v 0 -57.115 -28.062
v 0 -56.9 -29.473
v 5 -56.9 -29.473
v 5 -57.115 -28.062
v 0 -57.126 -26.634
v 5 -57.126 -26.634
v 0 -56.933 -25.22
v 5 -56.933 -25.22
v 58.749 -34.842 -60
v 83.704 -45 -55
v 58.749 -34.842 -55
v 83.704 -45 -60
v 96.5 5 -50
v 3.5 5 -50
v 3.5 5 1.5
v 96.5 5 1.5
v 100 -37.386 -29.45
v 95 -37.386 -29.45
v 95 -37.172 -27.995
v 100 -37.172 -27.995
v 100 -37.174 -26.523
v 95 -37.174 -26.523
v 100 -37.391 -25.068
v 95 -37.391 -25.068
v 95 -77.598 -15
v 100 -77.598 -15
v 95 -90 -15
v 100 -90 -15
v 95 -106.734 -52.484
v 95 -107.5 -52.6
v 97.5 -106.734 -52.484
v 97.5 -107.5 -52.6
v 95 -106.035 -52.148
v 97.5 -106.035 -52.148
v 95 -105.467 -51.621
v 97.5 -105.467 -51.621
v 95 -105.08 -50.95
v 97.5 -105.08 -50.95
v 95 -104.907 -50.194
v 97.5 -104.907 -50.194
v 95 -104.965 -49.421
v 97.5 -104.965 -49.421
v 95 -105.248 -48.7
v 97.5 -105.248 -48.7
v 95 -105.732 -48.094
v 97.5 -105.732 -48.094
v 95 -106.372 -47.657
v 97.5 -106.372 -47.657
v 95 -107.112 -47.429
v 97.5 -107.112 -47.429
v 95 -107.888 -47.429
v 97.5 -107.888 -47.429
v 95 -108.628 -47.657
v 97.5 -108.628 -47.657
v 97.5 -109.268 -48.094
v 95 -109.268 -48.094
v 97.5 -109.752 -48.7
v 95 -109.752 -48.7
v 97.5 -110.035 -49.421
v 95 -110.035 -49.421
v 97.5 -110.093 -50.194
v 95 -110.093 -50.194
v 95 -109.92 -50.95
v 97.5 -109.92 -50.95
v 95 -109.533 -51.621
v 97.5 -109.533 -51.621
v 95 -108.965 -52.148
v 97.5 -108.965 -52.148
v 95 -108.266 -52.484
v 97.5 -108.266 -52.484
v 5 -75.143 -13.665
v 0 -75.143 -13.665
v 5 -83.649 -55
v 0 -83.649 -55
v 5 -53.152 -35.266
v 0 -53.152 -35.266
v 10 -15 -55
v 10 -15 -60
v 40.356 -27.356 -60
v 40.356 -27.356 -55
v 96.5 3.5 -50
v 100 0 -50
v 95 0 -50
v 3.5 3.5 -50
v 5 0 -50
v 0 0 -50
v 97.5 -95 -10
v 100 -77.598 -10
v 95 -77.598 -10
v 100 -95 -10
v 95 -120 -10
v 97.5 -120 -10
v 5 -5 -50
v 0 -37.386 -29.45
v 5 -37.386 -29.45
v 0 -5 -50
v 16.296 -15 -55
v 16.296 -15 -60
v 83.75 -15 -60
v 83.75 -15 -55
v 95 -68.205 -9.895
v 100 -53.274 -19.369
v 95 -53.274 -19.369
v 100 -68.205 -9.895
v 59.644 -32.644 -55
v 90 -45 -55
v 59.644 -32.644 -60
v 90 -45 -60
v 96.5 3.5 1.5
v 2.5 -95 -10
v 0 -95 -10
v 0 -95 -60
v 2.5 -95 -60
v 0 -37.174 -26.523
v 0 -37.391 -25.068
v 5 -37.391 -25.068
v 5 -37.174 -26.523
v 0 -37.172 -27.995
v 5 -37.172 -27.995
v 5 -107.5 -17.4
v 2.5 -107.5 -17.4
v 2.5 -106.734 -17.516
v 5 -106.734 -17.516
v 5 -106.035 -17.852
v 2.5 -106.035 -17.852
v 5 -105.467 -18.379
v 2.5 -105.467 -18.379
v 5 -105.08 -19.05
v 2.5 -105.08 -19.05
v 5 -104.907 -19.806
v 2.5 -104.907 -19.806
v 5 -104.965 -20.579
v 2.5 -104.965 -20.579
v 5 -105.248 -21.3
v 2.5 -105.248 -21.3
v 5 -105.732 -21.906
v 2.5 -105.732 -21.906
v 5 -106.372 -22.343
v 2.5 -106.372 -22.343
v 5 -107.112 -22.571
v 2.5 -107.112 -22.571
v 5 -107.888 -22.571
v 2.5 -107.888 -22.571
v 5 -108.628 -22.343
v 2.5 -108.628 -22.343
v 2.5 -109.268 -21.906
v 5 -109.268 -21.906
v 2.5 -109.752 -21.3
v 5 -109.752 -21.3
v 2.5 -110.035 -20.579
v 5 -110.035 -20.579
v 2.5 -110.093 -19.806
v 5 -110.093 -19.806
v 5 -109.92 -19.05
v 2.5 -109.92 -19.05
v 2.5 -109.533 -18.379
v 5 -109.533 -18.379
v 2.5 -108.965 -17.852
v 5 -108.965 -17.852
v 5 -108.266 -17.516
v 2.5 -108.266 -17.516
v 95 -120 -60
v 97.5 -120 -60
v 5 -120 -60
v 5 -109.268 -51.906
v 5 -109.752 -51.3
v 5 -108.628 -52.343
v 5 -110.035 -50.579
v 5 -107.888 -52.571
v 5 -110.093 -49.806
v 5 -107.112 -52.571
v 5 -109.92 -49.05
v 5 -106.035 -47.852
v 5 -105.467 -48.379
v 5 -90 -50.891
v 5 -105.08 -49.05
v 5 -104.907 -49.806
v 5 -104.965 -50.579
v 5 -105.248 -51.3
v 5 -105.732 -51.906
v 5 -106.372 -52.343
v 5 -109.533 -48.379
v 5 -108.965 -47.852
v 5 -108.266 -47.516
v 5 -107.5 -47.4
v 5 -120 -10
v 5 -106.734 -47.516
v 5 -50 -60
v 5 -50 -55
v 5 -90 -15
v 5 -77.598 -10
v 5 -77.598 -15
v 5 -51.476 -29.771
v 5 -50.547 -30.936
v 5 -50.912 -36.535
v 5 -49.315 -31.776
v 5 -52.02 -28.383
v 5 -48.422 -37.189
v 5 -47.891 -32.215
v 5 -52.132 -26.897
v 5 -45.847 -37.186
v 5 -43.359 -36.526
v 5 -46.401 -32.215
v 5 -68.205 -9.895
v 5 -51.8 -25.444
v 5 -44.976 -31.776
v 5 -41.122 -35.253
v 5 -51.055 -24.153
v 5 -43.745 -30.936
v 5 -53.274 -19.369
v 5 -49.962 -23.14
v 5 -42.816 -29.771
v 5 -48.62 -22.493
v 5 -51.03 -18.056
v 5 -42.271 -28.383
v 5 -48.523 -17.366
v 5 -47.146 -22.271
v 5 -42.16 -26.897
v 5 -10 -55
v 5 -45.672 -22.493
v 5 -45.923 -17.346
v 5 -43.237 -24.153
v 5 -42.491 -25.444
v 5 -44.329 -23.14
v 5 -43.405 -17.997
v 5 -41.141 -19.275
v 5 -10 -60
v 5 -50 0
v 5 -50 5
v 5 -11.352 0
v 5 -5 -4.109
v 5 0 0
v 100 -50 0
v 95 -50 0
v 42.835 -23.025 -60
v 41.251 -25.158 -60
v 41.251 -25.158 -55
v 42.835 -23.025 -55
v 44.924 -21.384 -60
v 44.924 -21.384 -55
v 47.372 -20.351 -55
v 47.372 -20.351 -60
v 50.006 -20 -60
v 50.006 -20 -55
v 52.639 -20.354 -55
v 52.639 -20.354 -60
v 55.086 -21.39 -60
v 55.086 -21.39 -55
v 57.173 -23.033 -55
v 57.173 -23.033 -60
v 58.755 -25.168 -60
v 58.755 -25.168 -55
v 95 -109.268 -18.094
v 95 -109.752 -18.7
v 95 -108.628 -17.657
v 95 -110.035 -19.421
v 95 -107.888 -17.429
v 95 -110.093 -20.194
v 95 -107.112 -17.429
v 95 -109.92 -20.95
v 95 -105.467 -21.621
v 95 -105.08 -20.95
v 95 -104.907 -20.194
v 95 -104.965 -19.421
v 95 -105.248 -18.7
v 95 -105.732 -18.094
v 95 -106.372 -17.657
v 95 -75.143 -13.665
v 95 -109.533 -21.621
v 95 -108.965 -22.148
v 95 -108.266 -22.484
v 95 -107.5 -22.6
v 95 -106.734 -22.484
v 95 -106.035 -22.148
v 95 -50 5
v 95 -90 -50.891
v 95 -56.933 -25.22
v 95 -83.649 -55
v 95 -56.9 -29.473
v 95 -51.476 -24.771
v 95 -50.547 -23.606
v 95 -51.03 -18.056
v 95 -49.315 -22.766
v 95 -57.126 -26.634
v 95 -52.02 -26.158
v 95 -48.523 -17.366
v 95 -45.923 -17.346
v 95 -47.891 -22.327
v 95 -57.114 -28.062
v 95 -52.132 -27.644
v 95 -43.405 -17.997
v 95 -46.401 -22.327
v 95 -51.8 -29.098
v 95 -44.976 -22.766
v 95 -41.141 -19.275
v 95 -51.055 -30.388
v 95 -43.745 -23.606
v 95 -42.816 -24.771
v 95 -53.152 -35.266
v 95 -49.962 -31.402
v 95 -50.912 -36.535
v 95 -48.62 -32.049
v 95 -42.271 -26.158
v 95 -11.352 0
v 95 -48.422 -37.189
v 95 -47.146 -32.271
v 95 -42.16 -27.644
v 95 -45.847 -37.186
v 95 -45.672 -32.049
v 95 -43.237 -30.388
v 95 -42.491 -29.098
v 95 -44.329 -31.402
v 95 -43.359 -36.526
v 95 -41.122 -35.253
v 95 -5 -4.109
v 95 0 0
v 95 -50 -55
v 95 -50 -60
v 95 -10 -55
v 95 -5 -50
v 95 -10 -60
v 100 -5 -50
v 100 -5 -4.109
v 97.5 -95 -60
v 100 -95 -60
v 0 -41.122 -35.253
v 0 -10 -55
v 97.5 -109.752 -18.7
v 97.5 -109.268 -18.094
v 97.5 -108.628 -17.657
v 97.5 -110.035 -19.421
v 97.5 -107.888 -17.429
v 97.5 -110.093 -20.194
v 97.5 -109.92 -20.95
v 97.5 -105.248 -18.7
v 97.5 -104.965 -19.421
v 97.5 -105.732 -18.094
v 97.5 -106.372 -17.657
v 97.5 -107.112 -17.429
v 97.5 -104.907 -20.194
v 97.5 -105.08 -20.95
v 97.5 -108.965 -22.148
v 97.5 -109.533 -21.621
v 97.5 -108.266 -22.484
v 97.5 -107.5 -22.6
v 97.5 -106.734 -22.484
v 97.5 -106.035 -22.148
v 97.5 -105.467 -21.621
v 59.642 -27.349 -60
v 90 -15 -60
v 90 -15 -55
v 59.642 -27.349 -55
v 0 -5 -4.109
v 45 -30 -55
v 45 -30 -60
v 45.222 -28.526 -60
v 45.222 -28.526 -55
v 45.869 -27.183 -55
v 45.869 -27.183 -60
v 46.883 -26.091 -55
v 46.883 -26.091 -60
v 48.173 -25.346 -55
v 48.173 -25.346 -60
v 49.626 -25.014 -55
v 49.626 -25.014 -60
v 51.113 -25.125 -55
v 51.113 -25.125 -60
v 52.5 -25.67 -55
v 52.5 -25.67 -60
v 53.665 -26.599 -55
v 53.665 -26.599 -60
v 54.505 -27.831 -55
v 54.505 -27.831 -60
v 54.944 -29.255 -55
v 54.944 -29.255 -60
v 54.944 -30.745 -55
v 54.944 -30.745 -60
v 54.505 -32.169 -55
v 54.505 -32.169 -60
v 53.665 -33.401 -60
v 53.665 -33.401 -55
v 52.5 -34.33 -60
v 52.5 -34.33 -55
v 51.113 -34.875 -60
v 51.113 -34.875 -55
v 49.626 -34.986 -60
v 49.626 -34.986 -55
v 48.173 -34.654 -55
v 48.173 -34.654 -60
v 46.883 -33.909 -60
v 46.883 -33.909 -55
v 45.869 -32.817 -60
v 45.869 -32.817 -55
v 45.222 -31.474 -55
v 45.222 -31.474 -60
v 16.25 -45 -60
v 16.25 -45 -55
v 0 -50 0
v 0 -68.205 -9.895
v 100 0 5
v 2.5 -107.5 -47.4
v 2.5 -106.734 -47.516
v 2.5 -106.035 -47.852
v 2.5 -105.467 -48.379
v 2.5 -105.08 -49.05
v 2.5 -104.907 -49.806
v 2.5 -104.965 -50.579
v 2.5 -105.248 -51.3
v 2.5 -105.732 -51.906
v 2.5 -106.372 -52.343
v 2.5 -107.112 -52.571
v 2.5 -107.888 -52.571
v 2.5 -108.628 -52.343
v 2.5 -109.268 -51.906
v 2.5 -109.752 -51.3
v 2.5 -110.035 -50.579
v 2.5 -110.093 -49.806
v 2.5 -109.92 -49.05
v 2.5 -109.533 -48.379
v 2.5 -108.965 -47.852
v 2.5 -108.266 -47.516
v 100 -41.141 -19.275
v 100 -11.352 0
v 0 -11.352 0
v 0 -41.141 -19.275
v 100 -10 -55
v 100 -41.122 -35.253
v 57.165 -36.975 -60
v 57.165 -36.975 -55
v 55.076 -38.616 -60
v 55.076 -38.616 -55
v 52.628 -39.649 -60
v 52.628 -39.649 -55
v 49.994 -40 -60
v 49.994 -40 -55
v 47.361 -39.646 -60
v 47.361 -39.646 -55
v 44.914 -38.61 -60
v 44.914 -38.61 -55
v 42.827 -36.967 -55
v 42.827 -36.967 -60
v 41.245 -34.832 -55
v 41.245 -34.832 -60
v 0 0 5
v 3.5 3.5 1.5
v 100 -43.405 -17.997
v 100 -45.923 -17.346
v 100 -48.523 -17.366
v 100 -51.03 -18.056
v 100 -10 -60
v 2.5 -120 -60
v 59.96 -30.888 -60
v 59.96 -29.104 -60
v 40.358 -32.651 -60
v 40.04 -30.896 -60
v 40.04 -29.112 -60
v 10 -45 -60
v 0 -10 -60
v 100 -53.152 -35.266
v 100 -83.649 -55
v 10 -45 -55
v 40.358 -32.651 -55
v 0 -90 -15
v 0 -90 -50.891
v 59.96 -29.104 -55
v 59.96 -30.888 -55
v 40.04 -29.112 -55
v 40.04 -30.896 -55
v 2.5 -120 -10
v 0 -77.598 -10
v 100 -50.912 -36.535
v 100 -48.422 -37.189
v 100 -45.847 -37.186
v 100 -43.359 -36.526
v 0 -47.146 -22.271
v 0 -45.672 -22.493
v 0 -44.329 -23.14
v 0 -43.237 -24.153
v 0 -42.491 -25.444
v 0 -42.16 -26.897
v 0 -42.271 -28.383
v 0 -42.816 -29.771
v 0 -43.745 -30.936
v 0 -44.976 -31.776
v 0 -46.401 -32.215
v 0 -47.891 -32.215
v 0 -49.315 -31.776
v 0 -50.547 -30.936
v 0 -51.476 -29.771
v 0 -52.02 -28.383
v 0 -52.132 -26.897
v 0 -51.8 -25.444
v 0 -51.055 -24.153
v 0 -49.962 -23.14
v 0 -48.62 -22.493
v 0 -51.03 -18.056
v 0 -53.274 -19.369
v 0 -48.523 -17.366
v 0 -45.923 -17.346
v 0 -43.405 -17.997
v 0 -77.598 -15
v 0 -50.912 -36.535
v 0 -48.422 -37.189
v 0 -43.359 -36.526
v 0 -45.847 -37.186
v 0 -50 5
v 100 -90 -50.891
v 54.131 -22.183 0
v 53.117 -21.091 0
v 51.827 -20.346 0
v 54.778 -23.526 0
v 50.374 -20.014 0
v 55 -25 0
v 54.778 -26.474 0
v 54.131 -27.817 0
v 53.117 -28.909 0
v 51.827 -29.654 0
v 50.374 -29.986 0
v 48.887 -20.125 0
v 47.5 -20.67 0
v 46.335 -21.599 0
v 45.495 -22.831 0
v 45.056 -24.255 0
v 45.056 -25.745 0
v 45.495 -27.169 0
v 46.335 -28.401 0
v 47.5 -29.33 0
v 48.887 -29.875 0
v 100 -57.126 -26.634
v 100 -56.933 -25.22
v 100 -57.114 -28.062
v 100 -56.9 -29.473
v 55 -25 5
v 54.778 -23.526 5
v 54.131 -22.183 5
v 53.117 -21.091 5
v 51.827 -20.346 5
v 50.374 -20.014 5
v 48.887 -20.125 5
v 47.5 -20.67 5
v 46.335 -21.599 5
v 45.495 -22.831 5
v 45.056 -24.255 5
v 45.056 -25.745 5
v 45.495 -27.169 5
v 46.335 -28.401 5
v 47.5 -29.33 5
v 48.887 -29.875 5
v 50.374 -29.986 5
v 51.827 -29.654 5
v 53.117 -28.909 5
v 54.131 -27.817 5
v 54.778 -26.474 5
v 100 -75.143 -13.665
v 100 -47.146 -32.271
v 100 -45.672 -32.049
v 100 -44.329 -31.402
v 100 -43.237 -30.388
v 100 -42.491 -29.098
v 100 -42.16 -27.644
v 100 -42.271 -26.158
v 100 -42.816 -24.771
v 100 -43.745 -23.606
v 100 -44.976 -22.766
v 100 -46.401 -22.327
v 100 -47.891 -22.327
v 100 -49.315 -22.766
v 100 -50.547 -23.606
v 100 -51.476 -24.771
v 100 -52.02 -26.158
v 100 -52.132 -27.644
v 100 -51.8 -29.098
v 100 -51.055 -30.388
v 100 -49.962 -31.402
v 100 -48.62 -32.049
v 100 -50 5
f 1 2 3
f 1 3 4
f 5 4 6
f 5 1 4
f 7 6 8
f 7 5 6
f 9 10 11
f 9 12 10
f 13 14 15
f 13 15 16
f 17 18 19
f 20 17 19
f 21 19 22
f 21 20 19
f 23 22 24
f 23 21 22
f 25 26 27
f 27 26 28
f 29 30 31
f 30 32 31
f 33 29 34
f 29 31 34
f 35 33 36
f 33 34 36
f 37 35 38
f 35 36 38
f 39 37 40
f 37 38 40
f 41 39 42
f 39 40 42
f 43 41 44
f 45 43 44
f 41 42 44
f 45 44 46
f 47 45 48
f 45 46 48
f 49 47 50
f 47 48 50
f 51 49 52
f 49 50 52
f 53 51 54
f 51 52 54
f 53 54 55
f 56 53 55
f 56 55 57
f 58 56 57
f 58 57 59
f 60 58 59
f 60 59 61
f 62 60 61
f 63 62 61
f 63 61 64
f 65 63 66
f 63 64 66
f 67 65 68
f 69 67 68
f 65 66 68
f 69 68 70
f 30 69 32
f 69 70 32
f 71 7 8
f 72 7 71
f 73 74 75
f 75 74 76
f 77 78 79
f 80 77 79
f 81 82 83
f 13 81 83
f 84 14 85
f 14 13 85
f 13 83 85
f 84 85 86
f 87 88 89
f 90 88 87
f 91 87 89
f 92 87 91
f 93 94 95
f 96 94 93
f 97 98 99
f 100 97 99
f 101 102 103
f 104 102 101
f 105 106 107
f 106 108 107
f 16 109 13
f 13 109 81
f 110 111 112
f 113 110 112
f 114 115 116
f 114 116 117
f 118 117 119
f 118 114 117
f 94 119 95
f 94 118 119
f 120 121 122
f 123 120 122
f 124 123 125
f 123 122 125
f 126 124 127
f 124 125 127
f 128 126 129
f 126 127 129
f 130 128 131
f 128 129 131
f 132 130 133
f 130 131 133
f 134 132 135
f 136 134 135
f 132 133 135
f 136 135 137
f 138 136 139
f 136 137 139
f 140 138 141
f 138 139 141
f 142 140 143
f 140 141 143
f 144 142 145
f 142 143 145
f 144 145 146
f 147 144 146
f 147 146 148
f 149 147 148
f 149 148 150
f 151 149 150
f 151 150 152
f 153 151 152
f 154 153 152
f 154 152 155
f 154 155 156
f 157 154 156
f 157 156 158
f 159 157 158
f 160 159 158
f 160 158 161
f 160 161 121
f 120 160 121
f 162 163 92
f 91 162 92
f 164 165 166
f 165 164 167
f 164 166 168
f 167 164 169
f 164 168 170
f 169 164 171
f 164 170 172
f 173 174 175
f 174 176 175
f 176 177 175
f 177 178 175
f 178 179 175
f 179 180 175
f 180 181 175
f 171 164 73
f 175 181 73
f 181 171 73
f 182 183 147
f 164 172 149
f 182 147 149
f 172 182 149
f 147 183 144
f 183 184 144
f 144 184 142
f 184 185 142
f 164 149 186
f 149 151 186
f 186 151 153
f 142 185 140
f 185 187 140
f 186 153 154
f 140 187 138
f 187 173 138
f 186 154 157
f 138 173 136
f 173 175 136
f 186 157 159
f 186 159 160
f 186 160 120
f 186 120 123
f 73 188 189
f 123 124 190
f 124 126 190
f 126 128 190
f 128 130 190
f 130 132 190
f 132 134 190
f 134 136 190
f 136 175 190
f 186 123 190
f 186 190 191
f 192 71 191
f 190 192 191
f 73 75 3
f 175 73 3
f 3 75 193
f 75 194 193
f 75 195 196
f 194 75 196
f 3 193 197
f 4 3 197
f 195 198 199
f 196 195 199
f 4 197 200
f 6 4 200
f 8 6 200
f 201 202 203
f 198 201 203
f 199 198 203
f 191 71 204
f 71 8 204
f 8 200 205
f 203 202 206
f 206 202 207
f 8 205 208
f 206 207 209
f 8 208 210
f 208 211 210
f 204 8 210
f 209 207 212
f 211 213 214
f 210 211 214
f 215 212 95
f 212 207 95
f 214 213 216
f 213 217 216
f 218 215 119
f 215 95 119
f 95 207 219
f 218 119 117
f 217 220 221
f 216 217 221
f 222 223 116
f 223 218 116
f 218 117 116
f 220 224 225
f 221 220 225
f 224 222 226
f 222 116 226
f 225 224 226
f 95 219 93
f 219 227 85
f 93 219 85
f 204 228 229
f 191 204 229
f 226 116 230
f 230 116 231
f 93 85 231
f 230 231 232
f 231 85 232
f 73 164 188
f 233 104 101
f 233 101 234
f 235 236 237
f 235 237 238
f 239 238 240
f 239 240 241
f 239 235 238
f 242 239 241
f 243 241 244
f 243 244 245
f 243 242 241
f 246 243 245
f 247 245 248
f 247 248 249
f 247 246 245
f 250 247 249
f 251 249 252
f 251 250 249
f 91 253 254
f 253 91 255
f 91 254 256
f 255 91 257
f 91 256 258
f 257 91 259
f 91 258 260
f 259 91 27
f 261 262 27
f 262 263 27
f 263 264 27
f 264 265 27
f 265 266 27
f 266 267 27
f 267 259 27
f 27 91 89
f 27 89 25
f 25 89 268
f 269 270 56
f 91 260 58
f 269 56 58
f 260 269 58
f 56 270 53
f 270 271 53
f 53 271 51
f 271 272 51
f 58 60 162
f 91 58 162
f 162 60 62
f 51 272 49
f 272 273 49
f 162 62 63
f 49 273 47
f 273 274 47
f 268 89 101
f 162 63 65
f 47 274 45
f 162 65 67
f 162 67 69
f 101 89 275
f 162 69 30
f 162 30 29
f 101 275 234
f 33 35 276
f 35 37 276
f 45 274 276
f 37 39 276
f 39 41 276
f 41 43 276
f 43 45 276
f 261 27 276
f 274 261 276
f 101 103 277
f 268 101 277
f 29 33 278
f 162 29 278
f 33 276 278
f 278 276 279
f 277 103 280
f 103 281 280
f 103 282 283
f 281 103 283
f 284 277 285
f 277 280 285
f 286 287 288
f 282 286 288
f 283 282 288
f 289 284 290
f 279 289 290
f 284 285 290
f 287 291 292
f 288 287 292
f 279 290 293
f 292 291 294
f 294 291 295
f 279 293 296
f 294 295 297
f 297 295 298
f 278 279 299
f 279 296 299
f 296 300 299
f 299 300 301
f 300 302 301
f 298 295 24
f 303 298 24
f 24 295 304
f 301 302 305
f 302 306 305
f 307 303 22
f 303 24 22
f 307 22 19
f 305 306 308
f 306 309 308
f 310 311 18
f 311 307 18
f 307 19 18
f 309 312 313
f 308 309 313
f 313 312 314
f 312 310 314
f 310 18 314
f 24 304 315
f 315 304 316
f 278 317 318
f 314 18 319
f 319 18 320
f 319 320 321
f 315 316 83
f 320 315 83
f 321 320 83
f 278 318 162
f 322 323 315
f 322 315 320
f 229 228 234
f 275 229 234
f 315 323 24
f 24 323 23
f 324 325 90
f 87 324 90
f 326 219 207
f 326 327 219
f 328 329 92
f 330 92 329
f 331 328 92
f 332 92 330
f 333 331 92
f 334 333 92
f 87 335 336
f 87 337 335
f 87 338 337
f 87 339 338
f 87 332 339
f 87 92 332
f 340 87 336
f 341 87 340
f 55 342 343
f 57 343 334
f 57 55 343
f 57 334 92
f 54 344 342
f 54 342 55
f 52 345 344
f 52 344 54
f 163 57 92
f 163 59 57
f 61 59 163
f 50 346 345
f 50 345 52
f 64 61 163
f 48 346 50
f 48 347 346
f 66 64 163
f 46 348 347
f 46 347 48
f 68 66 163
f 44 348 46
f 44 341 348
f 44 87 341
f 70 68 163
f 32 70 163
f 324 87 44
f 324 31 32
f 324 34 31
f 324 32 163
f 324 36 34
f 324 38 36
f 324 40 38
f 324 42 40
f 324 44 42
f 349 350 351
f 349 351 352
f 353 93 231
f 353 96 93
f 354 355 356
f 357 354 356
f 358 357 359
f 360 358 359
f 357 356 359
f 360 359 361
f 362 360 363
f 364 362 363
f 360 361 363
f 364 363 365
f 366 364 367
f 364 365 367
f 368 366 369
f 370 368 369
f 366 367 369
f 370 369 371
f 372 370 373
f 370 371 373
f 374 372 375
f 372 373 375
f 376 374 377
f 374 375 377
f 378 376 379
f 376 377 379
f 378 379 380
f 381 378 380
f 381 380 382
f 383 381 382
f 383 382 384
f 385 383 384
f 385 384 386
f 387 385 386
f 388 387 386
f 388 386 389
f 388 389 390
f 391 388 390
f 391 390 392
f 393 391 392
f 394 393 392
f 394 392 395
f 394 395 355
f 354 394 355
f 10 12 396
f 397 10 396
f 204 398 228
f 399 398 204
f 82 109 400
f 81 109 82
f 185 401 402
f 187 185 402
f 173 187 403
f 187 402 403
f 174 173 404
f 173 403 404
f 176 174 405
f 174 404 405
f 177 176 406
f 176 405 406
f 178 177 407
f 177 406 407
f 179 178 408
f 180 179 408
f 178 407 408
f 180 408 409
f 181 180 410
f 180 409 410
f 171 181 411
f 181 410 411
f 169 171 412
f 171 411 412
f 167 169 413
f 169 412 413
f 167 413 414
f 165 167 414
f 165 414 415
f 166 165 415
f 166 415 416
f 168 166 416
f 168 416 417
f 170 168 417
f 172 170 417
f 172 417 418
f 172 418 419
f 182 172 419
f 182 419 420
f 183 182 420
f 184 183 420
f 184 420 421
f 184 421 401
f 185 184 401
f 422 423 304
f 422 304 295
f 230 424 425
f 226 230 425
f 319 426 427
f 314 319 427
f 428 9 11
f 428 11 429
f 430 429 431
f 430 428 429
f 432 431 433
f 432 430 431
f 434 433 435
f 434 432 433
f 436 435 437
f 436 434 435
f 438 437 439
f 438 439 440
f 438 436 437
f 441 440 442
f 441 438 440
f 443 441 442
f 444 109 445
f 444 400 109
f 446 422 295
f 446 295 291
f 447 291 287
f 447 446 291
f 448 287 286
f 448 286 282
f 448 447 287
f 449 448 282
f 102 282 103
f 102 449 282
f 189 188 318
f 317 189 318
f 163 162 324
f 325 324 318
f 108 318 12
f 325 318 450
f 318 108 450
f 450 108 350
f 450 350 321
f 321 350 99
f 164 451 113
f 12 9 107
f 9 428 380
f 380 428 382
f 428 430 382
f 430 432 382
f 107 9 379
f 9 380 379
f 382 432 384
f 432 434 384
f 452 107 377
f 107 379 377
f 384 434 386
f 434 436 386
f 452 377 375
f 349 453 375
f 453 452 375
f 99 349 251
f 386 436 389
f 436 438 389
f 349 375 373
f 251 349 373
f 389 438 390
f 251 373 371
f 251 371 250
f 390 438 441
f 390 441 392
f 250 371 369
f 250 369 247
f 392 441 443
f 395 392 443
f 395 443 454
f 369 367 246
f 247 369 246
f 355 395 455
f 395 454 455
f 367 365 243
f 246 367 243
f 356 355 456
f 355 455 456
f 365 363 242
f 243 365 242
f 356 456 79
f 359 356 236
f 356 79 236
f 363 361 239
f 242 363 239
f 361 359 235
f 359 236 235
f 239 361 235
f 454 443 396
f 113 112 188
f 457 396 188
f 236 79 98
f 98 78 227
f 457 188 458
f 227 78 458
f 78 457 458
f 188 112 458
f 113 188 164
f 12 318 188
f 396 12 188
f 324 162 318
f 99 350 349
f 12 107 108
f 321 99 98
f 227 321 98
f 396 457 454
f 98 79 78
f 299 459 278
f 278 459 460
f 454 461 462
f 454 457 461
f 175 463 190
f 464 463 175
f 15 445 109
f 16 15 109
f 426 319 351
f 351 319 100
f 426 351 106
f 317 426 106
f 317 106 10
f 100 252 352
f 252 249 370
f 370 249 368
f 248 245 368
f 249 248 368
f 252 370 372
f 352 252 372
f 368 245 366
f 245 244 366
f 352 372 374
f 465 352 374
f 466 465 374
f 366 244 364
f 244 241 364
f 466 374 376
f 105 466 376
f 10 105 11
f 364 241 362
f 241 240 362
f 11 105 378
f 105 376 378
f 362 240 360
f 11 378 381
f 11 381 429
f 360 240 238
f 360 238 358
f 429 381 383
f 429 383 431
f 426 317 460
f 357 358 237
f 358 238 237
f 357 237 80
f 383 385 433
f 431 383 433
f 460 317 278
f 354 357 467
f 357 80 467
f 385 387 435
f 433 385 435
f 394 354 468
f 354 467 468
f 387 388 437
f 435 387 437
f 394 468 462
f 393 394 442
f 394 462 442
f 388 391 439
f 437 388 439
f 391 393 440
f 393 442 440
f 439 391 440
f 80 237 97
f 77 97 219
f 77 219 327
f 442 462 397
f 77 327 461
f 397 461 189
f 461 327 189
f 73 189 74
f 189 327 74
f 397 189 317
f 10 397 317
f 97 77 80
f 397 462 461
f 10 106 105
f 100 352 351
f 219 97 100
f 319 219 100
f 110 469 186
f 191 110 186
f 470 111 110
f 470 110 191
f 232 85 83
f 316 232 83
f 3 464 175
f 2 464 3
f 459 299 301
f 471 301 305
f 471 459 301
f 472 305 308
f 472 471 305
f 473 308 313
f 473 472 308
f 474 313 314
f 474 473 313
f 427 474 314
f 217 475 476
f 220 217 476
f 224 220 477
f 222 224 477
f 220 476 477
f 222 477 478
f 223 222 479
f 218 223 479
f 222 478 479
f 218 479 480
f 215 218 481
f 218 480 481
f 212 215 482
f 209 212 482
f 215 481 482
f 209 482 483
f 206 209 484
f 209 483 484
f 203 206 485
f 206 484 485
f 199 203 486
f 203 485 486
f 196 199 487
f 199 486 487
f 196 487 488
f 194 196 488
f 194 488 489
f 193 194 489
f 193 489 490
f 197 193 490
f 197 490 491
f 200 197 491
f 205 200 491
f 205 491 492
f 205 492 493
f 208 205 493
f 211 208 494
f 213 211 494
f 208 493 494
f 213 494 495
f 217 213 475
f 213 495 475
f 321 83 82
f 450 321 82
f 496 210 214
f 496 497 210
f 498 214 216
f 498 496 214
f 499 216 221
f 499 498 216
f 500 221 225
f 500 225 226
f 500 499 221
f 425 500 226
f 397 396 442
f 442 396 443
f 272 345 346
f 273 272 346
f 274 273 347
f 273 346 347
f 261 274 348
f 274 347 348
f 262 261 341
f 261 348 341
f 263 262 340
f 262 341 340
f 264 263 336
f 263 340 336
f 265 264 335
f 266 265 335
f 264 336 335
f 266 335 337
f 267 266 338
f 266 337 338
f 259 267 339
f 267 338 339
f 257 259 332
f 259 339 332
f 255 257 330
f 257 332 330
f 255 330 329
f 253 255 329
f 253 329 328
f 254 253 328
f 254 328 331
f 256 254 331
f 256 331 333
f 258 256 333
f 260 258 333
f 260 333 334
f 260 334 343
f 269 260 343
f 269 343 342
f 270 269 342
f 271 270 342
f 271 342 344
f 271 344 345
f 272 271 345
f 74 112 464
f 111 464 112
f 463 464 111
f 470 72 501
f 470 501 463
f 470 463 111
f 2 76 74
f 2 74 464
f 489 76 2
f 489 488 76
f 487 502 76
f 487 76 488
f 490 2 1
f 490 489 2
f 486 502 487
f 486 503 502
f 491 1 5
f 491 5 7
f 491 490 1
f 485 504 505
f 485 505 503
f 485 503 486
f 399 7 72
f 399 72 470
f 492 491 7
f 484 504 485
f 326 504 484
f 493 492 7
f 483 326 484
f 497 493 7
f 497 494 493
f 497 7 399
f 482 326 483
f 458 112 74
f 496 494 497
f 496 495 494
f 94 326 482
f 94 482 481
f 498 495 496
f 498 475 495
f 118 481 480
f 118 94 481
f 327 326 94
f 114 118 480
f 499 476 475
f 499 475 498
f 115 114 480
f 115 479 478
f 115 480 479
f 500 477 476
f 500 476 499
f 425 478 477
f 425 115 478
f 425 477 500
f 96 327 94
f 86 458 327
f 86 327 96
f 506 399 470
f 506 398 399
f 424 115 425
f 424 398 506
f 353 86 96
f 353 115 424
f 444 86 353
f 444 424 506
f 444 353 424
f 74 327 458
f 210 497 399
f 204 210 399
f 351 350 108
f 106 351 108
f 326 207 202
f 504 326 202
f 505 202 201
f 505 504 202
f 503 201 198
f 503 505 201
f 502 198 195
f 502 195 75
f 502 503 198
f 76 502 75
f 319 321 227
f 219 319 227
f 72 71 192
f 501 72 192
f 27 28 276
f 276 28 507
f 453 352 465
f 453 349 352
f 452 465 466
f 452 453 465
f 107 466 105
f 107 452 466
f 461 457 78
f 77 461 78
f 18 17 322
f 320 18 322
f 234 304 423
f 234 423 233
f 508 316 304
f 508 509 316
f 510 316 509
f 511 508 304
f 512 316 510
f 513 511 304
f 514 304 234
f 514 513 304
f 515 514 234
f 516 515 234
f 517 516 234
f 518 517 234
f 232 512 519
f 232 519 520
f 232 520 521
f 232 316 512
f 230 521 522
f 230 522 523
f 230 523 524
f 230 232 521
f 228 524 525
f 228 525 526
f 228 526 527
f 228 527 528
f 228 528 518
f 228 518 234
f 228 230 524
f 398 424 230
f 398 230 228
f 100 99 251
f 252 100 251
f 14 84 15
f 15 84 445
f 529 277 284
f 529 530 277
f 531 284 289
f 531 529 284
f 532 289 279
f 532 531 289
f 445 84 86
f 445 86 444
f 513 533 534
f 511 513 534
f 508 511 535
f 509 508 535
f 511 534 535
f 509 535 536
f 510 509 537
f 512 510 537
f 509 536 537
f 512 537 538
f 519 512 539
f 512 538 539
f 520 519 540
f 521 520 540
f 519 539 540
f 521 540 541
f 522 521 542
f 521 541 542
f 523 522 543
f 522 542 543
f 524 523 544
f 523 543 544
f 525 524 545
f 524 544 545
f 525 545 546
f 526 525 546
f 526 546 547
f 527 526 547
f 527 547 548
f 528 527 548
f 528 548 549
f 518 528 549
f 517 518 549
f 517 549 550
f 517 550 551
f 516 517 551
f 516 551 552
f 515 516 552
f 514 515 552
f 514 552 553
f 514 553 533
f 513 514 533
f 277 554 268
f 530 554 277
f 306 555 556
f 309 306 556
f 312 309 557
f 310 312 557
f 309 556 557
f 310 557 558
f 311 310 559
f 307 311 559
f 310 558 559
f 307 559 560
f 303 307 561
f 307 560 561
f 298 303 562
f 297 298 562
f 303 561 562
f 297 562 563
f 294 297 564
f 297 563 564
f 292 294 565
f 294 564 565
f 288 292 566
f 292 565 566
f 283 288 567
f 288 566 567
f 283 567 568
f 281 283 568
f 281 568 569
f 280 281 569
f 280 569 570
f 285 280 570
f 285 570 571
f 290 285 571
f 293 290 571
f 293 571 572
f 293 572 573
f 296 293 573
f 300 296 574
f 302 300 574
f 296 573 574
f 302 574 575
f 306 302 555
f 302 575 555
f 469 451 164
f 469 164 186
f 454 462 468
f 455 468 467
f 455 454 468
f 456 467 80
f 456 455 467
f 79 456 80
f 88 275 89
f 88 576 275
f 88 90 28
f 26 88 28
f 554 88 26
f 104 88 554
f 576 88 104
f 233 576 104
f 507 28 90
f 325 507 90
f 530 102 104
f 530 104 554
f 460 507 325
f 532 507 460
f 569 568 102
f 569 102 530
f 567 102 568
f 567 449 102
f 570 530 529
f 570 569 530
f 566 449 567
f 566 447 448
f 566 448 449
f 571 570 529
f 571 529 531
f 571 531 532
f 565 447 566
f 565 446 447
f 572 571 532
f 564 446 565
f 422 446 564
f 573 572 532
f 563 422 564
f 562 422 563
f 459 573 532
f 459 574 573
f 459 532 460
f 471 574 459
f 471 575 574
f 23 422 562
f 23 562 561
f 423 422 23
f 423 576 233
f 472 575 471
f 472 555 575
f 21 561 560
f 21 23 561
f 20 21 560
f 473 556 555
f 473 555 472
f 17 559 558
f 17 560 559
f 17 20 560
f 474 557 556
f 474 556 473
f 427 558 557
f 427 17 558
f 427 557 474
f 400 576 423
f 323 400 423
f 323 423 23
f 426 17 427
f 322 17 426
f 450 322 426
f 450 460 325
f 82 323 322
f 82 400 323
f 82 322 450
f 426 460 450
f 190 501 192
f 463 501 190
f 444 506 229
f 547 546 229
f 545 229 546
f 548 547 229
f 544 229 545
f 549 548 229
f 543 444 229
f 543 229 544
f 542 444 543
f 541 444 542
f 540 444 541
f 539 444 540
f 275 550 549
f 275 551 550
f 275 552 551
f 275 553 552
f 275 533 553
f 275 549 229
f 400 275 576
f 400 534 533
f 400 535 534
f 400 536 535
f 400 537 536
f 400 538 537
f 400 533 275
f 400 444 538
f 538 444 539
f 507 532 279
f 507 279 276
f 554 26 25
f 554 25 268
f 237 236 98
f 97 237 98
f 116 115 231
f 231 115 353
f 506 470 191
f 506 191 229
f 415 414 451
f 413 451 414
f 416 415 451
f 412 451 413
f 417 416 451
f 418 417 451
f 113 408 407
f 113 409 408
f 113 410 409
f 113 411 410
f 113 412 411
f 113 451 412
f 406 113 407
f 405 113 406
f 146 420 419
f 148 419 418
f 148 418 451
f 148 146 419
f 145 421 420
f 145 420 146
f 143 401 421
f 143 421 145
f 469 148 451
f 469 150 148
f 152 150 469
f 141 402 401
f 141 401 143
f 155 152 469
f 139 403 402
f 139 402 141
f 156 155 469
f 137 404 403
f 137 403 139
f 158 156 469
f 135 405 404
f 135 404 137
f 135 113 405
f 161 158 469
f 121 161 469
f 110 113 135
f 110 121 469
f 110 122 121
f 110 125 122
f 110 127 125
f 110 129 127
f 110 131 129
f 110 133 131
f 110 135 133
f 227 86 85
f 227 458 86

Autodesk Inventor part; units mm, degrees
ref_plane "YZ Plane" through (0, 0, 0) normal (1, 0, 0) x (0, 1, 0)
ref_plane "XZ Plane" through (0, 0, 0) normal (0, 1, 0) x (-1, 0, 0)
ref_plane "XY Plane" through (0, 0, 0) normal (0, 0, 1) x (1, 0, 0)
sketch "Esquisse1" plane through (0, 0, 0) normal (0, 0, 1) x (1, 0, 0)
  line L0 (0, 0) -> (100, 0)
  line L1 (100, 0) -> (100, -50)
  line L2 (100, -50) -> (0, -50)
  line L3 (0, -50) -> (0, 0)
  dimension "d0" = 50
  dimension "d1" = 100
extrude "Extrusion1" add sketch "Esquisse1" along normal blind 5
sketch "Esquisse2" plane through (0, 0, 5) normal (0, 0, 1) x (1, 0, 0)
  line L0 (100, 0) -> (0, 0) construction
  line L1 (0, -50) -> (100, -50) construction
  line L2 (0, 0) -> (100, -50) construction
  line L3 (0, 0) -> (0, -50) construction
  line L4 (100, 0) -> (0, -50) construction
  circle A0 centre (50, -25) radius 5
  dimension "d4" = 10
extrude "Extrusion2" cut sketch "Esquisse2" against normal blind 5
sketch "Esquisse3" plane through (0, 0, 0) normal (0, 0, -1) x (-1, 0, 0)
  line L0 (-100, 0) -> (-95, 0)
  line L1 (-95, 0) -> (-95, -50)
  line L2 (-95, -50) -> (-100, -50)
  line L3 (-100, -50) -> (-100, 0)
  line L4 (0, 0) -> (-5, 0)
  line L5 (-5, 0) -> (-5, -50)
  line L6 (-5, -50) -> (0, -50)
  line L7 (0, -50) -> (0, 0)
  dimension "d7" = 5
  dimension "d8" = 5
extrude "Extrusion3" add sketch "Esquisse3" along normal blind 60
chamfer "Chanfrein1" distance 10 angle 45 1 edges at (97.5, 0, -60)
chamfer "Chanfrein2" distance 10 angle 45 1 edges at (2.5, 0, -60)
sketch "Esquisse4" plane through (100, -50, 5) normal (1, 0, 0) x (0, 0, -1)
  line L0 (0, 0) -> (15, -27.5984)
  line L1 (0, 50) -> (0, 0) projected
  line L2 (0, 0) -> (15, 0)
  line L3 (0, 0) -> (65, 0) projected
  line L4 (65, 0) -> (65, -70)
  line L5 (65, -70) -> (15, -70)
  line L6 (15, -27.5984) -> (15, -70)
  point P0 (5, 50)
  dimension "d17" = 15
  dimension "d18" = 70
extrude "Extrusion4" add sketch "Esquisse4" against normal blind 5
sketch "Esquisse5" plane through (100, 0, 5) normal (1, 0, 0) x (0, 0, -1)
  line L0 (65, -120) -> (15, -120) projected
  line L1 (65, -10) -> (65, -120) projected
  line L2 (15, -120) -> (65, -120)
  line L3 (65, -120) -> (65, -95)
  line L4 (65, -95) -> (15, -95)
  line L5 (15, -95) -> (15, -120)
  point P0 (5, 0)
  dimension "d21" = 25
extrude "Extrusion5" cut sketch "Esquisse5" against normal blind 2.5
sketch "Esquisse6" plane through (97.5, 0, 5) normal (1, 0, 0) x (0, 0, -1)
  circle A0 centre (25, -107.5) radius 2.6
  circle A1 centre (55, -107.5) radius 2.6
  line L0 (15, -120) -> (15, -95) projected
  line L1 (65, -95) -> (65, -120) projected
  line L2 (15, -95) -> (65, -95) projected
  point P0 (5, 0)
  dimension "d24" = 5.2
  dimension "d25" = 5.2
  dimension "d26" = 10
  dimension "d27" = 10
  dimension "d28" = 12.5
  dimension "d29" = 12.5
extrude "Extrusion6" cut sketch "Esquisse6" against normal blind 2.5
sketch "Esquisse8" plane through (0, 0, 5) normal (0, 1, 0) x (1, 0, 0)
  line L0 (3.5, 3.5) -> (96.5, 3.5)
  line L1 (96.5, 3.5) -> (96.5, 55)
  line L2 (96.5, 55) -> (3.5, 55)
  line L3 (3.5, 55) -> (3.5, 3.5)
  point P0 (0, 5)
extrude "Extrusion8" add sketch "Esquisse8" along normal blind 5
chamfer "Chanfrein5" distance 3.5 angle 45 1 edges at (96.5, 0, -24.25)
chamfer "Chanfrein6" distance 3.5 angle 45 1 edges at (50, 0, 1.5)
chamfer "Chanfrein7" distance 3.5 angle 45 1 edges at (3.5, 0, -24.25)
sketch "Esquisse9" plane through (0, 0, -60) normal (0, 0, -1) x (-1, 0, 0)
  line L0 (-5, -50) -> (0, -50) projected
  line L1 (-95, -10) -> (-95, 0) projected
  line L2 (-5, -50) -> (-95, -50)
  line L3 (-95, -50) -> (-95, -10)
  line L4 (-95, -10) -> (-5, -10)
  line L5 (-5, -10) -> (-5, -50)
  point P0 (0, 0)
extrude "Extrusion9" add sketch "Esquisse9" against normal blind 5
sketch "Esquisse10" plane through (0, -50, -60) normal (-1, 0, 0) x (0, 0, 1)
  line L0 (50, -27.5984) -> (65, 0) projected
  line L1 (65, 0) -> (50, -27.5984)
  line L2 (50, -70) -> (50, -27.5984) projected
  line L3 (50, -27.5984) -> (50, -70)
  line L4 (0, -70) -> (50, -70) projected
  line L5 (50, -70) -> (0, -70)
  line L6 (0, -70) -> (0, 0)
  line L7 (0, 0) -> (65, 0)
  point P0 (60, 50)
extrude "Extrusion10" add sketch "Esquisse10" against normal blind 5
sketch "Esquisse11" plane through (0, 0, -50) normal (-1, 0, 0) x (0, 0, 1)
  line L0 (40, -77.5984) -> (40, -120) projected
  line L1 (-10, -120) -> (40, -120)
  line L2 (40, -120) -> (40, -95)
  line L3 (40, -95) -> (-10, -95)
  line L4 (-10, -95) -> (-10, -120)
  point P0 (50, 0)
  dimension "d63" = 25
extrude "Extrusion11" cut sketch "Esquisse11" against normal blind 2.5
sketch "Esquisse12" plane through (2.5, 0, -50) normal (-1, 0, 0) x (0, 0, 1)
  circle A0 centre (0, -107.5) radius 2.6 projected
  circle A1 centre (0, -107.5) radius 2.6
  circle A2 centre (30, -107.5) radius 2.6 projected
  circle A3 centre (30, -107.5) radius 2.6
  point P0 (50, 0)
extrude "Extrusion12" cut sketch "Esquisse12" against normal blind 2.5
sketch "Esquisse13" plane through (100, -95, -10) normal (1, 0, 0) x (0, 0, -1)
  line L0 (-10, 90) -> (35.5969, 90)
  line L1 (-10, 47.7175) -> (-10, 90)
  line L2 (-15, 45) -> (-15, 95) projected
  line L3 (-15, 45) -> (0, 17.4016) projected
  line L4 (-10, 47.7175) -> (-10, 45)
  line L5 (-15, 45) -> (0, 17.4016) projected
  line L6 (-15, 95) -> (40, 95) projected
  line L7 (35.5969, 90) -> (40, 90)
  line L8 (45, 85) -> (45, 45) projected
  line L9 (45, 85) -> (45, 5.9149)
  line L10 (5, 17.4016) -> (5, 5)
  line L11 (5, 5) -> (45, 5)
  line L12 (45, 5) -> (45, 5.9149)
  line L13 (0, 0) -> (50, 0) projected
  line L14 (0, 17.4016) -> (0, 0) projected
  line L15 (5, 17.4016) -> (5, 17.4016)
  line L16 (5, 17.4016) -> (-10, 45)
  line L17 (40, 90) -> (45, 85)
  line L18 (45, 45) -> (45, 85) construction
  circle A0 centre (17.2708, 47.8542) radius 5
  circle A1 centre (17.2708, 47.8542) radius 10
  line L19 (19.4502, 57.6138) -> (40, 90)
  line L20 (45, 85) -> (25.2526, 53.8784)
  line L21 (3.6653, 19.8572) -> (15.2197, 38.0668)
  line L22 (9.3688, 41.7257) -> (-0.1053, 26.7947)
  line L23 (-5.8908, 90) -> (15.0684, 57.6086) construction
  line L24 (19.4729, 38.0996) -> (40.8908, 5)
  line L25 (-5.8908, 90) -> (15.0684, 57.6086)
  line L26 (25.2663, 41.8482) -> (45, 11.3507)
  line L27 (-10, 83.6477) -> (9.2748, 53.8594)
  line L28 (-10, 45) -> (-10, 95) projected
  line L29 (-10, 83.6477) -> (-10, 45)
  line L30 (-10, 45) -> (-0.1053, 26.7947)
  dimension "d71" = 5
  dimension "d72" = 5
  dimension "d73" = 5
  dimension "d74" = 5
  dimension "d78" = 5
  dimension "d79" = 10
  dimension "d83" = 5
extrude "Extrusion13" cut sketch "Esquisse13" against normal blind 5 contours L0 L7 L19 A1 L25 | L27 A1 L22 L16 L4 L1 | L8 L9 L26 A1 L20 | A1 L24 L11 L10 L16 L21 | A0
sketch "Esquisse14" plane through (0, 0, -50) normal (-1, 0, 0) x (0, 0, 1)
  line L0 (0, -5) -> (45.8908, -5) projected
  line L1 (0, -5) -> (45.8908, -5)
  line L2 (45.8908, -5) -> (50, -5)
  line L3 (0, -5) -> (-5, -10)
  line L4 (-5, -10) -> (-5, -90)
  line L5 (50, -5) -> (50, -50)
  line L6 (35, -77.5984) -> (35, -90) projected
  line L7 (50, -50) -> (35, -77.5984)
  line L8 (35, -77.5984) -> (35, -90)
  line L9 (35, -90) -> (-5, -90)
  line L10 (35, -90) -> (-0.8908, -90) projected
  line L11 (-5, -10) -> (14.7474, -41.1216) projected
  line L12 (-5, -10) -> (14.7474, -41.1216)
  line L13 (24.7803, -56.9332) -> (36.3347, -75.1428) projected
  line L14 (24.7803, -56.9332) -> (36.3347, -75.1428)
  line L15 (30.6312, -53.2743) -> (40.1053, -68.2053) projected
  line L16 (30.6312, -53.2743) -> (40.1053, -68.2053)
  arc A0 (30.6312, -53.2743) -> (30.7252, -41.1406) centre (22.7292, -47.1458) ccw projected
  line L17 (50, -11.3523) -> (30.7252, -41.1406)
  line L18 (-5, -83.6493) -> (14.7337, -53.1518) projected
  line L19 (14.7337, -53.1518) -> (-5, -83.6493)
  arc A1 (20.5271, -56.9004) -> (24.7803, -56.9332) centre (22.7292, -47.1458) ccw projected
  line L20 (-0.8908, -90) -> (20.5271, -56.9004) projected
  line L21 (-0.8908, -90) -> (20.5271, -56.9004)
  line L22 (20.5498, -37.3862) -> (0, -5) projected
  line L23 (0, -5) -> (20.5741, -37.4244)
  line L24 (24.9316, -37.3914) -> (45.8908, -5) projected
  line L25 (45.8908, -5) -> (24.9316, -37.3914)
  line L26 (-0.8908, -90) -> (35, -90)
  line L27 (35, -77.5984) -> (36.3347, -75.1428)
  line L28 (-5, -50) -> (-5, -10) projected
  line L29 (-5, -10) -> (14.7474, -41.1216)
  line L30 (-5, -10) -> (-5, -83.6493)
  arc A2 (14.7474, -41.1216) -> (14.7337, -53.1518) centre (22.7292, -47.1458) ccw projected
  line L31 (-5, -83.6493) -> (14.7337, -53.1518)
  line L32 (0, -5) -> (20.5741, -37.4244)
  line L33 (0, -5) -> (45.8908, -5)
  arc A3 (24.9316, -37.3914) -> (20.5498, -37.3862) centre (22.7292, -47.1458) ccw projected
  line L34 (24.9316, -37.3914) -> (45.8908, -5)
  line L35 (40.1053, -68.2053) -> (30.6312, -53.2743)
  line L36 (50, -50) -> (40.1053, -68.2053) projected
  line L37 (40.1053, -68.2053) -> (50, -50)
  line L38 (30.7252, -41.1406) -> (50, -11.3523) projected
  line L39 (50, -50) -> (50, -11.3523)
  line L40 (50, -11.3523) -> (30.7252, -41.1406)
  circle A4 centre (22.7292, -47.1458) radius 5
extrude "Extrusion14" cut sketch "Esquisse14" against normal blind 5 contours L0 L24 A3 L22 | L11 A2 L18 L4 | L5 L7 L15 A0 L17 | L20 A1 L13 L7 L6 L9 | A4
sketch "Esquisse15" plane through (0, 0, -60) normal (0, 0, -1) x (-1, 0, 0)
  line L0 (-5, -50) -> (-95, -50) construction
  circle A0 centre (-50, -30) radius 5
  circle A1 centre (-50, -30) radius 10
  line L1 (-95, -10) -> (-5, -10) construction
  line L2 (-95, -10) -> (-95, -50) construction
  line L3 (-5, -9.9768) -> (-5, -50) construction
  line L4 (-90, -18.6348) -> (-90, -45)
  line L5 (-90, -45) -> (-10, -45)
  line L6 (-10, -45) -> (-10, -15)
  line L7 (-10, -15) -> (-90, -15)
  line L8 (-90, -15) -> (-90, -18.6348)
  line L9 (-90, -15) -> (-59.6422, -27.3489)
  line L10 (-83.75, -15) -> (-58.7548, -25.1675)
  line L11 (-41.2507, -25.1575) -> (-16.2956, -15)
  line L12 (-10, -15) -> (-40.3559, -27.3558)
  line L13 (-10, -45) -> (-40.3578, -32.6511)
  line L14 (-16.25, -45) -> (-41.2452, -34.8325)
  line L15 (-83.7044, -45) -> (-58.7493, -34.8425)
  line L16 (-90, -45) -> (-59.6441, -32.6442)
  point P0 (0, 0)
  dimension "d90" = 20
  dimension "d89" = 10
  dimension "d91" = 5
  dimension "d92" = 5
  dimension "d93" = 5
  dimension "d94" = 5
extrude "Extrusion15" cut sketch "Esquisse15" against normal blind 5 contours A0 | A1 L12 L6 L13 | A1 L10 L7 L11 | L14 L5 L15 A1 | A1 L16 L4 L8 L9
properties part number "Biceps1 v2" material "Plastique ABS"
